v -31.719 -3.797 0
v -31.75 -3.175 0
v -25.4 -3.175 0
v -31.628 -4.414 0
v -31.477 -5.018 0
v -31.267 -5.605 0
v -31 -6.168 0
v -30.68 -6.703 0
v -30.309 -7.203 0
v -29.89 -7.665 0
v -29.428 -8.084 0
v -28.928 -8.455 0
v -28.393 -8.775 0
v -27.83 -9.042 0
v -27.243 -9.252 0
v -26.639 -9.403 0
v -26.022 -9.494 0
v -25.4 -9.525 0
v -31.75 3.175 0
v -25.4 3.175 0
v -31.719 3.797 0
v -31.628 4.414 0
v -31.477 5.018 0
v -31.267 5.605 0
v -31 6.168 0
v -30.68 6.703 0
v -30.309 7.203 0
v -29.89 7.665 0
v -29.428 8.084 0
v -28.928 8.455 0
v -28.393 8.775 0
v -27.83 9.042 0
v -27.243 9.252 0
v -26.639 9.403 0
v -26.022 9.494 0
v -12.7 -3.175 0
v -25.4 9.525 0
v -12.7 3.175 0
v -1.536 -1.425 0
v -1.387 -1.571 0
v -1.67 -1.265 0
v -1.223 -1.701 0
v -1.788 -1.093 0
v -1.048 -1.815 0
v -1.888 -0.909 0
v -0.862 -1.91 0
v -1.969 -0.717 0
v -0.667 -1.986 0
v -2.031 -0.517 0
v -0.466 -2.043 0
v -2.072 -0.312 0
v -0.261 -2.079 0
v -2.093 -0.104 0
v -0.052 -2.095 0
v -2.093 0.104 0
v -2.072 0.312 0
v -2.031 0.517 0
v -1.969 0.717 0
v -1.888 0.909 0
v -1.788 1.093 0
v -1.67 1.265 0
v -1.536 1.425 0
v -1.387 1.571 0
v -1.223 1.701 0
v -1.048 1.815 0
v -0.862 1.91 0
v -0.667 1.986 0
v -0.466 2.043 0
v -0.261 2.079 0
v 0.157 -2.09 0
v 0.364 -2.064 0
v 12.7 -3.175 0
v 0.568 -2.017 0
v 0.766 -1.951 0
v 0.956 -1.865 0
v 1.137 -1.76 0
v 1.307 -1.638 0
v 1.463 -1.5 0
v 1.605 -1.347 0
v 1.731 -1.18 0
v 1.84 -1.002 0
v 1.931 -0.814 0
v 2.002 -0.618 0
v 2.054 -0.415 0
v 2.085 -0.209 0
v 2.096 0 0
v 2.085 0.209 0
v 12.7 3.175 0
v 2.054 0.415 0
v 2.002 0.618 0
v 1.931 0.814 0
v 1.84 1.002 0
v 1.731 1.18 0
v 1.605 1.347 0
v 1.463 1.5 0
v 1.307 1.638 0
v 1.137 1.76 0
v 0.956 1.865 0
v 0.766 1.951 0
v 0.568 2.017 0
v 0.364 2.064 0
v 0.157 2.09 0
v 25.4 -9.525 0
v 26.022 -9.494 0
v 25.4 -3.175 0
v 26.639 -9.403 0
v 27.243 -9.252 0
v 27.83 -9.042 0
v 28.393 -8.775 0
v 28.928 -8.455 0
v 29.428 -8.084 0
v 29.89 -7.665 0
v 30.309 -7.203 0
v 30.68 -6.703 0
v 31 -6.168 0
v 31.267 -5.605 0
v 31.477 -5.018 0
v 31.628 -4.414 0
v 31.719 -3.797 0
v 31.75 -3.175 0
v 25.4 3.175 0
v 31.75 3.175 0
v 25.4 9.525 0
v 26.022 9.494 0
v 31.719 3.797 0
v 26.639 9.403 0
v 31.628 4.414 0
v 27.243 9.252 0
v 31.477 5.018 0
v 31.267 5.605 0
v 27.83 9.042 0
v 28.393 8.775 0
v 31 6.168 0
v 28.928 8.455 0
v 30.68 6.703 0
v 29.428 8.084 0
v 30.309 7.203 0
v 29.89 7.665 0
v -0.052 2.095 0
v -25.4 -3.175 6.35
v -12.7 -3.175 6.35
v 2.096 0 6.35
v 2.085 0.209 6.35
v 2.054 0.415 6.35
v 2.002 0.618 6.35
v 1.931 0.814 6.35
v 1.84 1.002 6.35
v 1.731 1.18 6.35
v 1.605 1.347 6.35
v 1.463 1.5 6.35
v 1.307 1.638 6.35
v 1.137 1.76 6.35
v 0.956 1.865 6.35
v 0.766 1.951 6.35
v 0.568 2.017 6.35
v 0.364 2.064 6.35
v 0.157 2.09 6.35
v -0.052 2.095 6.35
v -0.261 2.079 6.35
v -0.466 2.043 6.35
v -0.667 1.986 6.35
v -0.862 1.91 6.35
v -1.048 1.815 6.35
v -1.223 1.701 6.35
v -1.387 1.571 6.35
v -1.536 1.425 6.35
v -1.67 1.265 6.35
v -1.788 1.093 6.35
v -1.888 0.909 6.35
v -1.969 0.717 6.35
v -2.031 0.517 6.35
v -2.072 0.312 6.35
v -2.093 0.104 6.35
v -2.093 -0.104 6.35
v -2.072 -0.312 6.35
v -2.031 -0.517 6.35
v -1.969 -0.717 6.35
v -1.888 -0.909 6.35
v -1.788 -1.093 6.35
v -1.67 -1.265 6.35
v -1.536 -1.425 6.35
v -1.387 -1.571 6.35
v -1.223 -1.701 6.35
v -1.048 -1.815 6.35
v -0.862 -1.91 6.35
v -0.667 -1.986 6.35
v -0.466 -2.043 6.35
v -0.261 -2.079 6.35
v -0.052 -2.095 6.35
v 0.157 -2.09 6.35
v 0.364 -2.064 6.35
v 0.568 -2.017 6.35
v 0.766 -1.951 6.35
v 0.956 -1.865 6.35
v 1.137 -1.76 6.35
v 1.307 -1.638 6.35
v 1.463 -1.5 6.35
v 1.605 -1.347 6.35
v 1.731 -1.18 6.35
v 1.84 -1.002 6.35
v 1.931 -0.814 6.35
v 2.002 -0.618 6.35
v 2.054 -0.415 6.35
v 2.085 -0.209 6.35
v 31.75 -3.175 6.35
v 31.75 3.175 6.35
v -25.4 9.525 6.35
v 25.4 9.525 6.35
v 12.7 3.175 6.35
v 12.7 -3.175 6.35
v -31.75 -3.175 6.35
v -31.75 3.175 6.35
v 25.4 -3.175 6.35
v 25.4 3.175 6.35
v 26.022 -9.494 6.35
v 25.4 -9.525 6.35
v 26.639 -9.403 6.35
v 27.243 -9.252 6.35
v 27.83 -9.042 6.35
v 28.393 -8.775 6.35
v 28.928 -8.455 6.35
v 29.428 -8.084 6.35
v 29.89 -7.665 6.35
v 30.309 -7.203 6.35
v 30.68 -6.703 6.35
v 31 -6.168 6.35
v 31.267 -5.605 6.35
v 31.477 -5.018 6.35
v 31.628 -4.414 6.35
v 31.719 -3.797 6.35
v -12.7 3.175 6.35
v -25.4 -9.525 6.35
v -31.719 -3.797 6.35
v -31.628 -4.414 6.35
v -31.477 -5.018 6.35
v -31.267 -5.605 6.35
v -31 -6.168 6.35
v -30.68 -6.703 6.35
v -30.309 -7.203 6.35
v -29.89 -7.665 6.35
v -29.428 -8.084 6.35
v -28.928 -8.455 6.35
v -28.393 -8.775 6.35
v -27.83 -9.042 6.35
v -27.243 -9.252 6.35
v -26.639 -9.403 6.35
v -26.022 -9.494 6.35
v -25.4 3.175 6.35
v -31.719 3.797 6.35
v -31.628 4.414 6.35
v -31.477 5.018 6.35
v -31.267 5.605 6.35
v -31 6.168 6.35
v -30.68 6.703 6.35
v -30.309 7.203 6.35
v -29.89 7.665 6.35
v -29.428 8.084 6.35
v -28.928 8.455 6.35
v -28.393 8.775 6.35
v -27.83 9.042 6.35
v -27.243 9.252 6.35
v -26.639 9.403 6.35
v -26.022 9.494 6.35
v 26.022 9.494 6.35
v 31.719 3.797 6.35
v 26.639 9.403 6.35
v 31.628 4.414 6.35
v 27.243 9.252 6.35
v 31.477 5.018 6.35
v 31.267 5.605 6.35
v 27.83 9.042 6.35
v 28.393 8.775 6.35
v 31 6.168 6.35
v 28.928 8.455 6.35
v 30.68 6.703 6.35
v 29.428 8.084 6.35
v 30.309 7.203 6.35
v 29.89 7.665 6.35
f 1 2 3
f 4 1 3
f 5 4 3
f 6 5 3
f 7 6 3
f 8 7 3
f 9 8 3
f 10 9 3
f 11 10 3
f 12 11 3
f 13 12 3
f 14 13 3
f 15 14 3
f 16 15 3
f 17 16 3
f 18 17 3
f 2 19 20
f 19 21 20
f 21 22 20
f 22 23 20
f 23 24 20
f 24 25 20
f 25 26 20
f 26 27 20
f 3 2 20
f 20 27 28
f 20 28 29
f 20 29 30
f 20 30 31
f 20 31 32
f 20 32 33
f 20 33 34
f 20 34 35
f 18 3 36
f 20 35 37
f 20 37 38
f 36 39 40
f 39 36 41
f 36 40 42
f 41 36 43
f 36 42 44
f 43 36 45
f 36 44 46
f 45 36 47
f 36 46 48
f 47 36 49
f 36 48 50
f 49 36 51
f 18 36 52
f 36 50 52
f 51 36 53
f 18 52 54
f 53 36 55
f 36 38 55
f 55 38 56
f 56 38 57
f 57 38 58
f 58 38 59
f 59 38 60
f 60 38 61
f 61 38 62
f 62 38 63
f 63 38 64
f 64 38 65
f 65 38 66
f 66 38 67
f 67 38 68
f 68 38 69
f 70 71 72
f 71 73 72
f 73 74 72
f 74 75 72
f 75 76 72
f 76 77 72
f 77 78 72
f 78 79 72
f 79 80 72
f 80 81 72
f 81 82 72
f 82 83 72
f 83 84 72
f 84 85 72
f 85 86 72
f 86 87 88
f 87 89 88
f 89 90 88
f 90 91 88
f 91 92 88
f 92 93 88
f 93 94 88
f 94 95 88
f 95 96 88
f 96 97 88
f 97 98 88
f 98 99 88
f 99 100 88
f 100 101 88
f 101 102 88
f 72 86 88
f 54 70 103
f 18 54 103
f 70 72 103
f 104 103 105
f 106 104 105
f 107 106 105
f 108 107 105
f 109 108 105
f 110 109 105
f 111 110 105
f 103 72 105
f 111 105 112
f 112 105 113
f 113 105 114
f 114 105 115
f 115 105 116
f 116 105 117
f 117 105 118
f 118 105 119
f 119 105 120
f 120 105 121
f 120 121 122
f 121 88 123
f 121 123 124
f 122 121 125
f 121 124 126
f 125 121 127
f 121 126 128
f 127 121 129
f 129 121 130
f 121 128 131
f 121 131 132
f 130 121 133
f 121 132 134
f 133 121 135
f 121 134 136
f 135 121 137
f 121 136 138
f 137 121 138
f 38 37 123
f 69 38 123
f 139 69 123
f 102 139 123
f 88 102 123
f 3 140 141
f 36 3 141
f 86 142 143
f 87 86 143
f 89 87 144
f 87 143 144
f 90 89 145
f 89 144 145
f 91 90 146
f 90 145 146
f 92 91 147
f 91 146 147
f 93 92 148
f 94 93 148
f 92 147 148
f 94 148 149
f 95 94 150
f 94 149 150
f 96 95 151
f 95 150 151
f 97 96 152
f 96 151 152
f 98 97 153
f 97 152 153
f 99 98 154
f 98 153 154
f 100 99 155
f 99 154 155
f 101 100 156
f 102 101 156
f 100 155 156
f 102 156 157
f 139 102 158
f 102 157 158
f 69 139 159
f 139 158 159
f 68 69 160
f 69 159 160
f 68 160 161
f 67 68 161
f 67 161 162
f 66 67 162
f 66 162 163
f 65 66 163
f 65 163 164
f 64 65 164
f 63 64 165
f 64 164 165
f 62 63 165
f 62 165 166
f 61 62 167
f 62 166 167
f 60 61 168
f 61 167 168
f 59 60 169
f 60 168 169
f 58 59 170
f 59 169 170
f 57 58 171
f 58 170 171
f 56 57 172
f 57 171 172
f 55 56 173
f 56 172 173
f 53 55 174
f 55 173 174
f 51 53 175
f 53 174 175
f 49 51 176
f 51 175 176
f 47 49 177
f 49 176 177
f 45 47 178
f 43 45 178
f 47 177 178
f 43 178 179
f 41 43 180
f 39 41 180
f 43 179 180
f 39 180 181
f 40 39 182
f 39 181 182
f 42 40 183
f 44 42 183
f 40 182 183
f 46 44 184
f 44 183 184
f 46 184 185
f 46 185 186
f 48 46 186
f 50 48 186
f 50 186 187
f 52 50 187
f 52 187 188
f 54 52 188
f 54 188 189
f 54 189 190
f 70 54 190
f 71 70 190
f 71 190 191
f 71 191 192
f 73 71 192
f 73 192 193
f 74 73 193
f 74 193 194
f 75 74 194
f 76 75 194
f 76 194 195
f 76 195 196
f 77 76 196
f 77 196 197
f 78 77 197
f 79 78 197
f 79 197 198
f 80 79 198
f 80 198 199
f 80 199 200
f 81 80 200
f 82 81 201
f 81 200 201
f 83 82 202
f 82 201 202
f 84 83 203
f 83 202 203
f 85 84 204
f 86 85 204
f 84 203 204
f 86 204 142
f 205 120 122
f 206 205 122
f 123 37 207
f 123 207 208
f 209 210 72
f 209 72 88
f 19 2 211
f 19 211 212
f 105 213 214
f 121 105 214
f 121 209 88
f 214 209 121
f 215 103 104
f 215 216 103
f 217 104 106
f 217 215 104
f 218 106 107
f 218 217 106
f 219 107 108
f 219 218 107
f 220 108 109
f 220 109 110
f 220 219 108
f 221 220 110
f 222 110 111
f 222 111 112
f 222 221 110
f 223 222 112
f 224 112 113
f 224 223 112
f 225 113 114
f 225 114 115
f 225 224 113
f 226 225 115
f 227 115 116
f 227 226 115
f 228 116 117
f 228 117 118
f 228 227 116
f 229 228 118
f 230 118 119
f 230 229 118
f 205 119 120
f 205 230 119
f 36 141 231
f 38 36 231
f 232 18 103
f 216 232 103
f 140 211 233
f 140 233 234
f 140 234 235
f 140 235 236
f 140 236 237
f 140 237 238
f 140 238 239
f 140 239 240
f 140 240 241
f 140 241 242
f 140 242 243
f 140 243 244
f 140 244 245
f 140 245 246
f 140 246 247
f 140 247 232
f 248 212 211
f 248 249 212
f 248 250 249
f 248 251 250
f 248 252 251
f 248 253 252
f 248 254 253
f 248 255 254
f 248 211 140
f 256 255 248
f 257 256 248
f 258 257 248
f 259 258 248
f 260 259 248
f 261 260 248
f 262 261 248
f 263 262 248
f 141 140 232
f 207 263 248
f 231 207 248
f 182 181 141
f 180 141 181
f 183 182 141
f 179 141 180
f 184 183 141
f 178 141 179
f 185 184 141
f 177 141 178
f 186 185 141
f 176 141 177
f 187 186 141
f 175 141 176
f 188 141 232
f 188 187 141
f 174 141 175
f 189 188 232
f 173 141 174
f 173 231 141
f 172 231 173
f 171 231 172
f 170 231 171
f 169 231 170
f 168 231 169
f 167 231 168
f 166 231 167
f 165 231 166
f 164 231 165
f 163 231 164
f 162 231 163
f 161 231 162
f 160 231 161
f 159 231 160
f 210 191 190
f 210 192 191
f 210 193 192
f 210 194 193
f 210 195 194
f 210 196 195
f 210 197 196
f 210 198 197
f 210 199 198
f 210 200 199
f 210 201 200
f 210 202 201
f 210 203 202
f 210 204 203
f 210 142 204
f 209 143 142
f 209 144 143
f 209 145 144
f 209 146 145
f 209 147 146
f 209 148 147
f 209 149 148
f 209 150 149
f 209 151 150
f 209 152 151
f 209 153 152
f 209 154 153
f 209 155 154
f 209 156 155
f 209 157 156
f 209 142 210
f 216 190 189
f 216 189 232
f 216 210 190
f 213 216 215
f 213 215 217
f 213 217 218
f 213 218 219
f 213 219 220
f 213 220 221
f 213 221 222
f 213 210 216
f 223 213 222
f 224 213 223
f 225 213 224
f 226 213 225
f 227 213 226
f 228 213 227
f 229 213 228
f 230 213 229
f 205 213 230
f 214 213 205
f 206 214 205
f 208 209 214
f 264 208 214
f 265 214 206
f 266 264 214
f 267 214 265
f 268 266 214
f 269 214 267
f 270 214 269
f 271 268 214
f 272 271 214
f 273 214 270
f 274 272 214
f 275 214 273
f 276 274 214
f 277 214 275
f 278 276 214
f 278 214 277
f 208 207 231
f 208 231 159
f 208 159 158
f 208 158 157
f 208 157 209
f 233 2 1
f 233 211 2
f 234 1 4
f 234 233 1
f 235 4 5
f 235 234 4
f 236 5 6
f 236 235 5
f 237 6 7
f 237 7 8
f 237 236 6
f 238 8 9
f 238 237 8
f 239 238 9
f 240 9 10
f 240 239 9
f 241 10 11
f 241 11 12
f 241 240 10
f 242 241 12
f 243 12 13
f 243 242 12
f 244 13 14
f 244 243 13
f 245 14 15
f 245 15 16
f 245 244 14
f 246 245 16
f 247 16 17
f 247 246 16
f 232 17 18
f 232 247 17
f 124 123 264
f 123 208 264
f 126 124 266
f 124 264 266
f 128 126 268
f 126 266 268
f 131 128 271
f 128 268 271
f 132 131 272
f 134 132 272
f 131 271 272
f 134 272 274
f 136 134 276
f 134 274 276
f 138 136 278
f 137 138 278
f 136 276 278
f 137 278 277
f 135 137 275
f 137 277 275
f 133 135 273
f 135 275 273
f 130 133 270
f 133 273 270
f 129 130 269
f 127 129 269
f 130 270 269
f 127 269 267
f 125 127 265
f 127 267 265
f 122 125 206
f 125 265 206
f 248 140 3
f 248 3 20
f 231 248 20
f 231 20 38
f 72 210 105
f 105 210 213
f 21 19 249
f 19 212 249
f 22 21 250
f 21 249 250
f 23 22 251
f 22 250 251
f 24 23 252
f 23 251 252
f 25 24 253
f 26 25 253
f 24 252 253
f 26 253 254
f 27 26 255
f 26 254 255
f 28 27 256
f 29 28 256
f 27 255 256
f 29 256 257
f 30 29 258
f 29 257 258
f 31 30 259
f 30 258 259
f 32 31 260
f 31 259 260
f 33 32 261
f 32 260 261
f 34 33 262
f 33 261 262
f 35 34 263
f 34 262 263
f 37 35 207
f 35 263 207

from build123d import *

# Parameters (mm, degrees)
SKETCH1_W           = 63.5
SKETCH1_H           = 19.05
BOSS_EXTRUDE1_DEPTH = 6.35
SKETCH2_R           = 2.0955
SKETCH2_W           = 12.7
SKETCH2_H           = 6.35
CUT_EXTRUDE1_DEPTH  = 6.35
FILLET1_R           = 6.35


with BuildPart() as part:
    # Sketch1 → Boss-Extrude1 (new body)
    with BuildSketch(Plane.XY):
        Rectangle(SKETCH1_W, SKETCH1_H)
    extrude(amount=BOSS_EXTRUDE1_DEPTH)

    # Sketch2 → Cut-Extrude1 (cut)
    with BuildSketch(Plane.XY.offset(6.35)):
        Circle(SKETCH2_R)
        with Locations((-19.05, 0)):
            Rectangle(SKETCH2_W, SKETCH2_H)
        with Locations((19.05, 0)):
            Rectangle(SKETCH2_W, SKETCH2_H)
    extrude(amount=-CUT_EXTRUDE1_DEPTH, mode=Mode.SUBTRACT)

    # Fillet1
    fillet1_edges = [part.edges().sort_by_distance(p)[0] for p in [
        (31.75, -9.525, 3.175),
        (-31.75, -9.525, 3.175),
        (-31.75, 9.525, 3.175),
        (31.75, 9.525, 3.175),
    ]]
    fillet(fillet1_edges, radius=FILLET1_R)


solid = part.part
